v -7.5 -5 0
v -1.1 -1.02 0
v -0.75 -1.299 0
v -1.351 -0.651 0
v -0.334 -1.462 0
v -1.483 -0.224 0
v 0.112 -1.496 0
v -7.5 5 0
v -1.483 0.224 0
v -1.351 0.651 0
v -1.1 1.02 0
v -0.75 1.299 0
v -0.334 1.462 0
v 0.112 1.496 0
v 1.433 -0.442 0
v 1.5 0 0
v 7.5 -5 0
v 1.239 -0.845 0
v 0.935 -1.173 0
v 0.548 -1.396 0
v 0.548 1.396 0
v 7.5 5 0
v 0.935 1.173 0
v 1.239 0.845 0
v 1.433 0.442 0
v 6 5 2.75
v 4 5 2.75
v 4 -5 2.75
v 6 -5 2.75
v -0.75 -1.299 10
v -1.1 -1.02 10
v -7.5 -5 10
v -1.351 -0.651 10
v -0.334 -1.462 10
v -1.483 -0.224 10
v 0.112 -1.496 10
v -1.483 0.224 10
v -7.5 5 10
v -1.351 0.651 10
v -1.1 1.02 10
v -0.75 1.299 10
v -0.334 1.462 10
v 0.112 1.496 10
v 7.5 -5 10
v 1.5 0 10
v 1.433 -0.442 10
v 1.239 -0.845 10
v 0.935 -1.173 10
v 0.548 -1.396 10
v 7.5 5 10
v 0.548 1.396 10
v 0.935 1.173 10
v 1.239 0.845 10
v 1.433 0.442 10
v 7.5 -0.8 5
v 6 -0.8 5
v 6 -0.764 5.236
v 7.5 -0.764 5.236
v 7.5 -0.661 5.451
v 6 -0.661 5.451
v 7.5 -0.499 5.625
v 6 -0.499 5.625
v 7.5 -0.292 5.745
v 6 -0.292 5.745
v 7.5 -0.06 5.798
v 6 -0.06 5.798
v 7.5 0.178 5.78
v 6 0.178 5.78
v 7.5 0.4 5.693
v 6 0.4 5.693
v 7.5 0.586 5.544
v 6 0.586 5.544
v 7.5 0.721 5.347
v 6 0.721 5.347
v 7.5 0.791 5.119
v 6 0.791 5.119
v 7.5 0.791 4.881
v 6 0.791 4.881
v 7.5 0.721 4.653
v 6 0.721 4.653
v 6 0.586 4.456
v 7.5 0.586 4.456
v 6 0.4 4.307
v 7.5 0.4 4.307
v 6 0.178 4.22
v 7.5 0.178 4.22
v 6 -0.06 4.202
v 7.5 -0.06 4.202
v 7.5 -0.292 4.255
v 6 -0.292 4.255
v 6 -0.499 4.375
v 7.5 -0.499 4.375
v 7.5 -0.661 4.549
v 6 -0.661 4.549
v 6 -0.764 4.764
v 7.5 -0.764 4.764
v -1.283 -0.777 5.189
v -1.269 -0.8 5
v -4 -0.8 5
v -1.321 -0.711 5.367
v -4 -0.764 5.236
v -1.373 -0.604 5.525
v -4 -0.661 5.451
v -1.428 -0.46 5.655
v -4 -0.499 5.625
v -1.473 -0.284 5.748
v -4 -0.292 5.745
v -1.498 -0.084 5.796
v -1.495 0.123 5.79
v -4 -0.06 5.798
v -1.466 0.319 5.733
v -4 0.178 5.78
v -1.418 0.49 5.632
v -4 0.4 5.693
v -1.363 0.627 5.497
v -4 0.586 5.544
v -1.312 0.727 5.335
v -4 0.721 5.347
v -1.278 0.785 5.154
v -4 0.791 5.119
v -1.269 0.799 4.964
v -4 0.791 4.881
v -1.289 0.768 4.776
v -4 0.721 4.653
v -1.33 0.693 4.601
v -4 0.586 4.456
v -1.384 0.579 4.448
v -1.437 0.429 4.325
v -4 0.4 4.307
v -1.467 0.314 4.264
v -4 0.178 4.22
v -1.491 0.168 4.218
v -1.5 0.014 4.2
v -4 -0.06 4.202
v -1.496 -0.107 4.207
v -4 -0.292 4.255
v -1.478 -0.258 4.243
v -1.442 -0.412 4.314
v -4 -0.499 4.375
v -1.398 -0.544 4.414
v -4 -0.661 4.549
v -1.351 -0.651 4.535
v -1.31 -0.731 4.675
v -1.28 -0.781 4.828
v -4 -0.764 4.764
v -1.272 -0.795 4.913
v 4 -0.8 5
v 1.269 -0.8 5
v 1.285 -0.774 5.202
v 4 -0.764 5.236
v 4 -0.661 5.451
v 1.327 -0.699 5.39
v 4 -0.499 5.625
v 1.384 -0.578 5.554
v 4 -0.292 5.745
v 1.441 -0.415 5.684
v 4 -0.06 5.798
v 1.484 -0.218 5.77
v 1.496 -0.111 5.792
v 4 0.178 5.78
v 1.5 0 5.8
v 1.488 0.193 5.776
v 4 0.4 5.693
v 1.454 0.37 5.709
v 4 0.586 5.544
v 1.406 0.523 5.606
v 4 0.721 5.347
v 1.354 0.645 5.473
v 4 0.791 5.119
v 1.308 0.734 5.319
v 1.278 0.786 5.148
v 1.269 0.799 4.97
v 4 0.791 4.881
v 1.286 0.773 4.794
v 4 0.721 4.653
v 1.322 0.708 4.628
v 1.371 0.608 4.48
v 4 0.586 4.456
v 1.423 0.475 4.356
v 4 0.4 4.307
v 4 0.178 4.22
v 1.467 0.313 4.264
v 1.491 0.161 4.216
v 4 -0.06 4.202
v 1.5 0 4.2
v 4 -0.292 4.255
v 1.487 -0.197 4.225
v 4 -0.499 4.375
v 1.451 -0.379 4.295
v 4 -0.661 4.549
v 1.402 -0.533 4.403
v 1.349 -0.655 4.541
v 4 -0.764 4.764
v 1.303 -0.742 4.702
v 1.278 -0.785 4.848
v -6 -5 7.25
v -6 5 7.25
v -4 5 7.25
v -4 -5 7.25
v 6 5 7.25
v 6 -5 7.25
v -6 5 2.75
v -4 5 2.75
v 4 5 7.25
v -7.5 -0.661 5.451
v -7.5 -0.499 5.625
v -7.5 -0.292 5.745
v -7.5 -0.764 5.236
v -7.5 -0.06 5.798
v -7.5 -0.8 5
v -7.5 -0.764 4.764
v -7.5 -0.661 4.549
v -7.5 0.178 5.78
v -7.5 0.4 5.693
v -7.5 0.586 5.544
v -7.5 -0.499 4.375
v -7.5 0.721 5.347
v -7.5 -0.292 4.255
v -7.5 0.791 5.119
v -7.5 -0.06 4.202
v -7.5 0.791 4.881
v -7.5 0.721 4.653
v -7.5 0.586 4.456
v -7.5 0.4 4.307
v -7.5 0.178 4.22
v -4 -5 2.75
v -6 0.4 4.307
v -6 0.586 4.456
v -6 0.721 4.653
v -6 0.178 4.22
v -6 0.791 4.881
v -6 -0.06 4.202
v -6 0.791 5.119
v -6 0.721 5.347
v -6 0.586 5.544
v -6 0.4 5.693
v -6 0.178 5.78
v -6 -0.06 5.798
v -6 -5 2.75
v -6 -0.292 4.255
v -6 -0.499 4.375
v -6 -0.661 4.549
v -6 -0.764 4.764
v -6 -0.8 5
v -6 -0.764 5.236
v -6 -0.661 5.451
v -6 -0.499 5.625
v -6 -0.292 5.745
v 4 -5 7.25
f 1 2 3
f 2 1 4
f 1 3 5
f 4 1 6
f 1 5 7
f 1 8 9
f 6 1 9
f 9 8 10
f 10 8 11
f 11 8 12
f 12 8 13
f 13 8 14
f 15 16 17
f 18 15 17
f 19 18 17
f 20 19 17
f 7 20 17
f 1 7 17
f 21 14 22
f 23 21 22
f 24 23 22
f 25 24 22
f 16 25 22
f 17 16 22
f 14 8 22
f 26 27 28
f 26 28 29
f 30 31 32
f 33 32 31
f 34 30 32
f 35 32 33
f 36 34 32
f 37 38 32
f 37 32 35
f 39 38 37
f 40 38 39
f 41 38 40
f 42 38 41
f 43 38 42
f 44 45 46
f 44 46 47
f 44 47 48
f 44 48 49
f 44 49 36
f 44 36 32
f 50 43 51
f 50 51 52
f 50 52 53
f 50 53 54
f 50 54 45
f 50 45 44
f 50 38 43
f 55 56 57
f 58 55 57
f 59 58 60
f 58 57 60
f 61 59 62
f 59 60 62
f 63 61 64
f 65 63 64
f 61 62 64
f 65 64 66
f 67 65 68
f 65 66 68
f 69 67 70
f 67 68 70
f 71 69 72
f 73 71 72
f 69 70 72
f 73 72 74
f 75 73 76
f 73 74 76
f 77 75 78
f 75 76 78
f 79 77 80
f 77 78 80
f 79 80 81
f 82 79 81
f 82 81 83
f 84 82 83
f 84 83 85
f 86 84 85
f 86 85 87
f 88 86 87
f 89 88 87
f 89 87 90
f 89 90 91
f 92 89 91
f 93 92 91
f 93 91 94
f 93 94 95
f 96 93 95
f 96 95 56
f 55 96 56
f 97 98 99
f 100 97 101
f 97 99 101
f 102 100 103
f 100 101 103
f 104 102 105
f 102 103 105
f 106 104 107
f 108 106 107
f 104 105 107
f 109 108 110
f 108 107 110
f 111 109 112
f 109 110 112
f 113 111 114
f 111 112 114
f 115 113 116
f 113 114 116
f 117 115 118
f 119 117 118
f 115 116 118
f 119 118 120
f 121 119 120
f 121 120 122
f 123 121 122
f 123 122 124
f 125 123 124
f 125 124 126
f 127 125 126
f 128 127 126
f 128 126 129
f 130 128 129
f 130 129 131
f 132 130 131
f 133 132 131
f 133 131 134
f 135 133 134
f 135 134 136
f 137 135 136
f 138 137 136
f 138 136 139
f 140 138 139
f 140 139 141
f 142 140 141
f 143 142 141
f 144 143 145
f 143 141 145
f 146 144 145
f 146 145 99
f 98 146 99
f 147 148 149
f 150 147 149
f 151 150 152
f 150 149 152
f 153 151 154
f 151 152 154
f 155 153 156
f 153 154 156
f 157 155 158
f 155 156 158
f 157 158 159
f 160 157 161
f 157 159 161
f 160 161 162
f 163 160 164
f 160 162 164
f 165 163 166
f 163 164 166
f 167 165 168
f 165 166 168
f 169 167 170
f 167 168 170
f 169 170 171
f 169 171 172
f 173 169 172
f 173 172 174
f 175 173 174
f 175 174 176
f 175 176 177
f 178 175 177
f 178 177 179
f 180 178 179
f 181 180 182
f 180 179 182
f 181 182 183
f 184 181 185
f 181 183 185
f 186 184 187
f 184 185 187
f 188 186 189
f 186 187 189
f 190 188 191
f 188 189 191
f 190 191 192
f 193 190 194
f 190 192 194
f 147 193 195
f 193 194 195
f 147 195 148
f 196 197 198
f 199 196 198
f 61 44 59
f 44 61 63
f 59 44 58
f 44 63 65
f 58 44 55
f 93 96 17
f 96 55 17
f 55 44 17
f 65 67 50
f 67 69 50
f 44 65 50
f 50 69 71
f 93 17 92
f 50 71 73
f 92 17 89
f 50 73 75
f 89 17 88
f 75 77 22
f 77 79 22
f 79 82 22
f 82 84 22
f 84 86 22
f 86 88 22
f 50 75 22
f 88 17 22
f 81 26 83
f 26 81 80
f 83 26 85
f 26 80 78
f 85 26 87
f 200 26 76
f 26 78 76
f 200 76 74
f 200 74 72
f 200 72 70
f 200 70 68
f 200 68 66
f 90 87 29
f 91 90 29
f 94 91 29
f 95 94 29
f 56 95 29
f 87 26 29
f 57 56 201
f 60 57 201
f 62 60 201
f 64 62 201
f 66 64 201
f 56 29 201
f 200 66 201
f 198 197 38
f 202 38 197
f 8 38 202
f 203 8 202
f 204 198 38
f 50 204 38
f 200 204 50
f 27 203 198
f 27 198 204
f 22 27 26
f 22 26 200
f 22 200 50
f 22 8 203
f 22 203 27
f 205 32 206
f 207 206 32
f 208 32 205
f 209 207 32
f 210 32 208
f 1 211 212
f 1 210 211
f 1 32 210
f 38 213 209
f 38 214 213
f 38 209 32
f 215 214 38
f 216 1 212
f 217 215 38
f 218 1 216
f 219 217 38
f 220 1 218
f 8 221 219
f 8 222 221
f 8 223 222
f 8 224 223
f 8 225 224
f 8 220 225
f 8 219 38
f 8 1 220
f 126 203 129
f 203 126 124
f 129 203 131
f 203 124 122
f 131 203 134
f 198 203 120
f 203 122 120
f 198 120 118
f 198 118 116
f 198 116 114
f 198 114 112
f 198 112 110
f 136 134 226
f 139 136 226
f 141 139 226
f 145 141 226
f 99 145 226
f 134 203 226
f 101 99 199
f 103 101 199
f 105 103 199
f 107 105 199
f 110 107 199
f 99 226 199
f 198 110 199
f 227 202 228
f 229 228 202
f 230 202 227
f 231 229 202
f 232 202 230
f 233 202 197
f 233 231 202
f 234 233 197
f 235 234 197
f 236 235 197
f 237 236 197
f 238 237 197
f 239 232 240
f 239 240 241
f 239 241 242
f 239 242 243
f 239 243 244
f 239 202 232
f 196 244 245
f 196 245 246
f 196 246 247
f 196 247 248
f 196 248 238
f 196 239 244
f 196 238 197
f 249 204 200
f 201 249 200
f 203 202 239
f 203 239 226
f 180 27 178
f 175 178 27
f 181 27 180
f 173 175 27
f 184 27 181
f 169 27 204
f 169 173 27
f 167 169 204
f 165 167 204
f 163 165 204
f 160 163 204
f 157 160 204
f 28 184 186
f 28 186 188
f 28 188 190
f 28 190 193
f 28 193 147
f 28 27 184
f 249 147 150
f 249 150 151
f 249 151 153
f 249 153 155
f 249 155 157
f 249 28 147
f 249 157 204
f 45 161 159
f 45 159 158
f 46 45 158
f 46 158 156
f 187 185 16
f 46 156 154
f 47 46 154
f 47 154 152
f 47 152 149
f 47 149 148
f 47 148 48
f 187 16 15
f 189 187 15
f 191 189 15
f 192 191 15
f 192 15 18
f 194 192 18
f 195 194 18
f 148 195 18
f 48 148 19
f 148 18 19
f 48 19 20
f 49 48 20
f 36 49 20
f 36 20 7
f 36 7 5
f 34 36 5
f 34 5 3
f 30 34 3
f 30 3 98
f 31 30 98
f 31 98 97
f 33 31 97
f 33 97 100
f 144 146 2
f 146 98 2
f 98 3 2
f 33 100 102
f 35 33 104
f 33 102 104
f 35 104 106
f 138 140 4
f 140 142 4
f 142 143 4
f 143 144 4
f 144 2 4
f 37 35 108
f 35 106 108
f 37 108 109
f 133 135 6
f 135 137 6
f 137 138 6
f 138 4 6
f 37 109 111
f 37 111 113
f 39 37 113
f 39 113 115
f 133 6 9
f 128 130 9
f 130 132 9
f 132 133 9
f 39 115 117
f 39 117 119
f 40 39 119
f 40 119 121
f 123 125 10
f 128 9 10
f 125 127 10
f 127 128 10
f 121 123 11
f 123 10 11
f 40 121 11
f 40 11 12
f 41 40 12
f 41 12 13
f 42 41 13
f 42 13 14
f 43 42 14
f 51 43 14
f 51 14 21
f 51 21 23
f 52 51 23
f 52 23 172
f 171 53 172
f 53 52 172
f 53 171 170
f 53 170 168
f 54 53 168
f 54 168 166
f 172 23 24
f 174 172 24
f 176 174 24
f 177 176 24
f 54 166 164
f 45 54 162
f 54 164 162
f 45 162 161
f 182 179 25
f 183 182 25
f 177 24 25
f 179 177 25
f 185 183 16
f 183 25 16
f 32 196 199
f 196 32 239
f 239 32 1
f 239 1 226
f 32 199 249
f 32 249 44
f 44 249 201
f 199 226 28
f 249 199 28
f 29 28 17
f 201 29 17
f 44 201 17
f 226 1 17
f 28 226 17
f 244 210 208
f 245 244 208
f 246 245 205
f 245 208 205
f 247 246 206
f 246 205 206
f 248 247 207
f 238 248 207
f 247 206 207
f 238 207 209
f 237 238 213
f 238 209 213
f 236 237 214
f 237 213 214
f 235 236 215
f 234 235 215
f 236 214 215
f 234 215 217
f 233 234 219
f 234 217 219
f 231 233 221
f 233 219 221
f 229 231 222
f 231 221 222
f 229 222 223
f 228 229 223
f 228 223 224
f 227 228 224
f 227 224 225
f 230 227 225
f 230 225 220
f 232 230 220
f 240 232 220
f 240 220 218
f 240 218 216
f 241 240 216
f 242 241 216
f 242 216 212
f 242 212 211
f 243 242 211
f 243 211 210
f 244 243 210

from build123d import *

# Parameters (mm, degrees)
F0_W     = 15
F0_H     = 10
F1_DEPTH = 10
F2_W     = 2
F2_H     = 4.5
F3_DEPTH = 10
F4_R     = 1.5
F5_DEPTH = 15
F6_R     = 0.8
F7_DEPTH = 15


with BuildPart() as f1:
    # F0 (on Top) → F1 (new body)
    with BuildSketch(Plane.XY):
        Rectangle(F0_W, F0_H)
    extrude(amount=F1_DEPTH)

    # F2 (on face) → F3 (cut, through all)
    with BuildSketch(Plane.XZ.offset(5)):
        with Locations((-5, 5)):
            Rectangle(F2_W, F2_H)
        with Locations((5, 5)):
            Rectangle(F2_W, F2_H)
    extrude(amount=-F3_DEPTH, mode=Mode.SUBTRACT)

    # F4 (on face) → F5 (cut)
    with BuildSketch(Plane(origin=(0, 0, 0), x_dir=(1, 0, 0), z_dir=(0, 0, -1))):
        Circle(F4_R)
    extrude(amount=-F5_DEPTH, mode=Mode.SUBTRACT)

    # F6 (on face) → F7 (cut, through all)
    with BuildSketch(Plane(origin=(-7.5, 0, 0), x_dir=(0, -1, 0), z_dir=(-1, 0, 0))):
        with Locations((0, 5)):
            Circle(F6_R)
    extrude(amount=-F7_DEPTH, mode=Mode.SUBTRACT)


solid = f1.part
